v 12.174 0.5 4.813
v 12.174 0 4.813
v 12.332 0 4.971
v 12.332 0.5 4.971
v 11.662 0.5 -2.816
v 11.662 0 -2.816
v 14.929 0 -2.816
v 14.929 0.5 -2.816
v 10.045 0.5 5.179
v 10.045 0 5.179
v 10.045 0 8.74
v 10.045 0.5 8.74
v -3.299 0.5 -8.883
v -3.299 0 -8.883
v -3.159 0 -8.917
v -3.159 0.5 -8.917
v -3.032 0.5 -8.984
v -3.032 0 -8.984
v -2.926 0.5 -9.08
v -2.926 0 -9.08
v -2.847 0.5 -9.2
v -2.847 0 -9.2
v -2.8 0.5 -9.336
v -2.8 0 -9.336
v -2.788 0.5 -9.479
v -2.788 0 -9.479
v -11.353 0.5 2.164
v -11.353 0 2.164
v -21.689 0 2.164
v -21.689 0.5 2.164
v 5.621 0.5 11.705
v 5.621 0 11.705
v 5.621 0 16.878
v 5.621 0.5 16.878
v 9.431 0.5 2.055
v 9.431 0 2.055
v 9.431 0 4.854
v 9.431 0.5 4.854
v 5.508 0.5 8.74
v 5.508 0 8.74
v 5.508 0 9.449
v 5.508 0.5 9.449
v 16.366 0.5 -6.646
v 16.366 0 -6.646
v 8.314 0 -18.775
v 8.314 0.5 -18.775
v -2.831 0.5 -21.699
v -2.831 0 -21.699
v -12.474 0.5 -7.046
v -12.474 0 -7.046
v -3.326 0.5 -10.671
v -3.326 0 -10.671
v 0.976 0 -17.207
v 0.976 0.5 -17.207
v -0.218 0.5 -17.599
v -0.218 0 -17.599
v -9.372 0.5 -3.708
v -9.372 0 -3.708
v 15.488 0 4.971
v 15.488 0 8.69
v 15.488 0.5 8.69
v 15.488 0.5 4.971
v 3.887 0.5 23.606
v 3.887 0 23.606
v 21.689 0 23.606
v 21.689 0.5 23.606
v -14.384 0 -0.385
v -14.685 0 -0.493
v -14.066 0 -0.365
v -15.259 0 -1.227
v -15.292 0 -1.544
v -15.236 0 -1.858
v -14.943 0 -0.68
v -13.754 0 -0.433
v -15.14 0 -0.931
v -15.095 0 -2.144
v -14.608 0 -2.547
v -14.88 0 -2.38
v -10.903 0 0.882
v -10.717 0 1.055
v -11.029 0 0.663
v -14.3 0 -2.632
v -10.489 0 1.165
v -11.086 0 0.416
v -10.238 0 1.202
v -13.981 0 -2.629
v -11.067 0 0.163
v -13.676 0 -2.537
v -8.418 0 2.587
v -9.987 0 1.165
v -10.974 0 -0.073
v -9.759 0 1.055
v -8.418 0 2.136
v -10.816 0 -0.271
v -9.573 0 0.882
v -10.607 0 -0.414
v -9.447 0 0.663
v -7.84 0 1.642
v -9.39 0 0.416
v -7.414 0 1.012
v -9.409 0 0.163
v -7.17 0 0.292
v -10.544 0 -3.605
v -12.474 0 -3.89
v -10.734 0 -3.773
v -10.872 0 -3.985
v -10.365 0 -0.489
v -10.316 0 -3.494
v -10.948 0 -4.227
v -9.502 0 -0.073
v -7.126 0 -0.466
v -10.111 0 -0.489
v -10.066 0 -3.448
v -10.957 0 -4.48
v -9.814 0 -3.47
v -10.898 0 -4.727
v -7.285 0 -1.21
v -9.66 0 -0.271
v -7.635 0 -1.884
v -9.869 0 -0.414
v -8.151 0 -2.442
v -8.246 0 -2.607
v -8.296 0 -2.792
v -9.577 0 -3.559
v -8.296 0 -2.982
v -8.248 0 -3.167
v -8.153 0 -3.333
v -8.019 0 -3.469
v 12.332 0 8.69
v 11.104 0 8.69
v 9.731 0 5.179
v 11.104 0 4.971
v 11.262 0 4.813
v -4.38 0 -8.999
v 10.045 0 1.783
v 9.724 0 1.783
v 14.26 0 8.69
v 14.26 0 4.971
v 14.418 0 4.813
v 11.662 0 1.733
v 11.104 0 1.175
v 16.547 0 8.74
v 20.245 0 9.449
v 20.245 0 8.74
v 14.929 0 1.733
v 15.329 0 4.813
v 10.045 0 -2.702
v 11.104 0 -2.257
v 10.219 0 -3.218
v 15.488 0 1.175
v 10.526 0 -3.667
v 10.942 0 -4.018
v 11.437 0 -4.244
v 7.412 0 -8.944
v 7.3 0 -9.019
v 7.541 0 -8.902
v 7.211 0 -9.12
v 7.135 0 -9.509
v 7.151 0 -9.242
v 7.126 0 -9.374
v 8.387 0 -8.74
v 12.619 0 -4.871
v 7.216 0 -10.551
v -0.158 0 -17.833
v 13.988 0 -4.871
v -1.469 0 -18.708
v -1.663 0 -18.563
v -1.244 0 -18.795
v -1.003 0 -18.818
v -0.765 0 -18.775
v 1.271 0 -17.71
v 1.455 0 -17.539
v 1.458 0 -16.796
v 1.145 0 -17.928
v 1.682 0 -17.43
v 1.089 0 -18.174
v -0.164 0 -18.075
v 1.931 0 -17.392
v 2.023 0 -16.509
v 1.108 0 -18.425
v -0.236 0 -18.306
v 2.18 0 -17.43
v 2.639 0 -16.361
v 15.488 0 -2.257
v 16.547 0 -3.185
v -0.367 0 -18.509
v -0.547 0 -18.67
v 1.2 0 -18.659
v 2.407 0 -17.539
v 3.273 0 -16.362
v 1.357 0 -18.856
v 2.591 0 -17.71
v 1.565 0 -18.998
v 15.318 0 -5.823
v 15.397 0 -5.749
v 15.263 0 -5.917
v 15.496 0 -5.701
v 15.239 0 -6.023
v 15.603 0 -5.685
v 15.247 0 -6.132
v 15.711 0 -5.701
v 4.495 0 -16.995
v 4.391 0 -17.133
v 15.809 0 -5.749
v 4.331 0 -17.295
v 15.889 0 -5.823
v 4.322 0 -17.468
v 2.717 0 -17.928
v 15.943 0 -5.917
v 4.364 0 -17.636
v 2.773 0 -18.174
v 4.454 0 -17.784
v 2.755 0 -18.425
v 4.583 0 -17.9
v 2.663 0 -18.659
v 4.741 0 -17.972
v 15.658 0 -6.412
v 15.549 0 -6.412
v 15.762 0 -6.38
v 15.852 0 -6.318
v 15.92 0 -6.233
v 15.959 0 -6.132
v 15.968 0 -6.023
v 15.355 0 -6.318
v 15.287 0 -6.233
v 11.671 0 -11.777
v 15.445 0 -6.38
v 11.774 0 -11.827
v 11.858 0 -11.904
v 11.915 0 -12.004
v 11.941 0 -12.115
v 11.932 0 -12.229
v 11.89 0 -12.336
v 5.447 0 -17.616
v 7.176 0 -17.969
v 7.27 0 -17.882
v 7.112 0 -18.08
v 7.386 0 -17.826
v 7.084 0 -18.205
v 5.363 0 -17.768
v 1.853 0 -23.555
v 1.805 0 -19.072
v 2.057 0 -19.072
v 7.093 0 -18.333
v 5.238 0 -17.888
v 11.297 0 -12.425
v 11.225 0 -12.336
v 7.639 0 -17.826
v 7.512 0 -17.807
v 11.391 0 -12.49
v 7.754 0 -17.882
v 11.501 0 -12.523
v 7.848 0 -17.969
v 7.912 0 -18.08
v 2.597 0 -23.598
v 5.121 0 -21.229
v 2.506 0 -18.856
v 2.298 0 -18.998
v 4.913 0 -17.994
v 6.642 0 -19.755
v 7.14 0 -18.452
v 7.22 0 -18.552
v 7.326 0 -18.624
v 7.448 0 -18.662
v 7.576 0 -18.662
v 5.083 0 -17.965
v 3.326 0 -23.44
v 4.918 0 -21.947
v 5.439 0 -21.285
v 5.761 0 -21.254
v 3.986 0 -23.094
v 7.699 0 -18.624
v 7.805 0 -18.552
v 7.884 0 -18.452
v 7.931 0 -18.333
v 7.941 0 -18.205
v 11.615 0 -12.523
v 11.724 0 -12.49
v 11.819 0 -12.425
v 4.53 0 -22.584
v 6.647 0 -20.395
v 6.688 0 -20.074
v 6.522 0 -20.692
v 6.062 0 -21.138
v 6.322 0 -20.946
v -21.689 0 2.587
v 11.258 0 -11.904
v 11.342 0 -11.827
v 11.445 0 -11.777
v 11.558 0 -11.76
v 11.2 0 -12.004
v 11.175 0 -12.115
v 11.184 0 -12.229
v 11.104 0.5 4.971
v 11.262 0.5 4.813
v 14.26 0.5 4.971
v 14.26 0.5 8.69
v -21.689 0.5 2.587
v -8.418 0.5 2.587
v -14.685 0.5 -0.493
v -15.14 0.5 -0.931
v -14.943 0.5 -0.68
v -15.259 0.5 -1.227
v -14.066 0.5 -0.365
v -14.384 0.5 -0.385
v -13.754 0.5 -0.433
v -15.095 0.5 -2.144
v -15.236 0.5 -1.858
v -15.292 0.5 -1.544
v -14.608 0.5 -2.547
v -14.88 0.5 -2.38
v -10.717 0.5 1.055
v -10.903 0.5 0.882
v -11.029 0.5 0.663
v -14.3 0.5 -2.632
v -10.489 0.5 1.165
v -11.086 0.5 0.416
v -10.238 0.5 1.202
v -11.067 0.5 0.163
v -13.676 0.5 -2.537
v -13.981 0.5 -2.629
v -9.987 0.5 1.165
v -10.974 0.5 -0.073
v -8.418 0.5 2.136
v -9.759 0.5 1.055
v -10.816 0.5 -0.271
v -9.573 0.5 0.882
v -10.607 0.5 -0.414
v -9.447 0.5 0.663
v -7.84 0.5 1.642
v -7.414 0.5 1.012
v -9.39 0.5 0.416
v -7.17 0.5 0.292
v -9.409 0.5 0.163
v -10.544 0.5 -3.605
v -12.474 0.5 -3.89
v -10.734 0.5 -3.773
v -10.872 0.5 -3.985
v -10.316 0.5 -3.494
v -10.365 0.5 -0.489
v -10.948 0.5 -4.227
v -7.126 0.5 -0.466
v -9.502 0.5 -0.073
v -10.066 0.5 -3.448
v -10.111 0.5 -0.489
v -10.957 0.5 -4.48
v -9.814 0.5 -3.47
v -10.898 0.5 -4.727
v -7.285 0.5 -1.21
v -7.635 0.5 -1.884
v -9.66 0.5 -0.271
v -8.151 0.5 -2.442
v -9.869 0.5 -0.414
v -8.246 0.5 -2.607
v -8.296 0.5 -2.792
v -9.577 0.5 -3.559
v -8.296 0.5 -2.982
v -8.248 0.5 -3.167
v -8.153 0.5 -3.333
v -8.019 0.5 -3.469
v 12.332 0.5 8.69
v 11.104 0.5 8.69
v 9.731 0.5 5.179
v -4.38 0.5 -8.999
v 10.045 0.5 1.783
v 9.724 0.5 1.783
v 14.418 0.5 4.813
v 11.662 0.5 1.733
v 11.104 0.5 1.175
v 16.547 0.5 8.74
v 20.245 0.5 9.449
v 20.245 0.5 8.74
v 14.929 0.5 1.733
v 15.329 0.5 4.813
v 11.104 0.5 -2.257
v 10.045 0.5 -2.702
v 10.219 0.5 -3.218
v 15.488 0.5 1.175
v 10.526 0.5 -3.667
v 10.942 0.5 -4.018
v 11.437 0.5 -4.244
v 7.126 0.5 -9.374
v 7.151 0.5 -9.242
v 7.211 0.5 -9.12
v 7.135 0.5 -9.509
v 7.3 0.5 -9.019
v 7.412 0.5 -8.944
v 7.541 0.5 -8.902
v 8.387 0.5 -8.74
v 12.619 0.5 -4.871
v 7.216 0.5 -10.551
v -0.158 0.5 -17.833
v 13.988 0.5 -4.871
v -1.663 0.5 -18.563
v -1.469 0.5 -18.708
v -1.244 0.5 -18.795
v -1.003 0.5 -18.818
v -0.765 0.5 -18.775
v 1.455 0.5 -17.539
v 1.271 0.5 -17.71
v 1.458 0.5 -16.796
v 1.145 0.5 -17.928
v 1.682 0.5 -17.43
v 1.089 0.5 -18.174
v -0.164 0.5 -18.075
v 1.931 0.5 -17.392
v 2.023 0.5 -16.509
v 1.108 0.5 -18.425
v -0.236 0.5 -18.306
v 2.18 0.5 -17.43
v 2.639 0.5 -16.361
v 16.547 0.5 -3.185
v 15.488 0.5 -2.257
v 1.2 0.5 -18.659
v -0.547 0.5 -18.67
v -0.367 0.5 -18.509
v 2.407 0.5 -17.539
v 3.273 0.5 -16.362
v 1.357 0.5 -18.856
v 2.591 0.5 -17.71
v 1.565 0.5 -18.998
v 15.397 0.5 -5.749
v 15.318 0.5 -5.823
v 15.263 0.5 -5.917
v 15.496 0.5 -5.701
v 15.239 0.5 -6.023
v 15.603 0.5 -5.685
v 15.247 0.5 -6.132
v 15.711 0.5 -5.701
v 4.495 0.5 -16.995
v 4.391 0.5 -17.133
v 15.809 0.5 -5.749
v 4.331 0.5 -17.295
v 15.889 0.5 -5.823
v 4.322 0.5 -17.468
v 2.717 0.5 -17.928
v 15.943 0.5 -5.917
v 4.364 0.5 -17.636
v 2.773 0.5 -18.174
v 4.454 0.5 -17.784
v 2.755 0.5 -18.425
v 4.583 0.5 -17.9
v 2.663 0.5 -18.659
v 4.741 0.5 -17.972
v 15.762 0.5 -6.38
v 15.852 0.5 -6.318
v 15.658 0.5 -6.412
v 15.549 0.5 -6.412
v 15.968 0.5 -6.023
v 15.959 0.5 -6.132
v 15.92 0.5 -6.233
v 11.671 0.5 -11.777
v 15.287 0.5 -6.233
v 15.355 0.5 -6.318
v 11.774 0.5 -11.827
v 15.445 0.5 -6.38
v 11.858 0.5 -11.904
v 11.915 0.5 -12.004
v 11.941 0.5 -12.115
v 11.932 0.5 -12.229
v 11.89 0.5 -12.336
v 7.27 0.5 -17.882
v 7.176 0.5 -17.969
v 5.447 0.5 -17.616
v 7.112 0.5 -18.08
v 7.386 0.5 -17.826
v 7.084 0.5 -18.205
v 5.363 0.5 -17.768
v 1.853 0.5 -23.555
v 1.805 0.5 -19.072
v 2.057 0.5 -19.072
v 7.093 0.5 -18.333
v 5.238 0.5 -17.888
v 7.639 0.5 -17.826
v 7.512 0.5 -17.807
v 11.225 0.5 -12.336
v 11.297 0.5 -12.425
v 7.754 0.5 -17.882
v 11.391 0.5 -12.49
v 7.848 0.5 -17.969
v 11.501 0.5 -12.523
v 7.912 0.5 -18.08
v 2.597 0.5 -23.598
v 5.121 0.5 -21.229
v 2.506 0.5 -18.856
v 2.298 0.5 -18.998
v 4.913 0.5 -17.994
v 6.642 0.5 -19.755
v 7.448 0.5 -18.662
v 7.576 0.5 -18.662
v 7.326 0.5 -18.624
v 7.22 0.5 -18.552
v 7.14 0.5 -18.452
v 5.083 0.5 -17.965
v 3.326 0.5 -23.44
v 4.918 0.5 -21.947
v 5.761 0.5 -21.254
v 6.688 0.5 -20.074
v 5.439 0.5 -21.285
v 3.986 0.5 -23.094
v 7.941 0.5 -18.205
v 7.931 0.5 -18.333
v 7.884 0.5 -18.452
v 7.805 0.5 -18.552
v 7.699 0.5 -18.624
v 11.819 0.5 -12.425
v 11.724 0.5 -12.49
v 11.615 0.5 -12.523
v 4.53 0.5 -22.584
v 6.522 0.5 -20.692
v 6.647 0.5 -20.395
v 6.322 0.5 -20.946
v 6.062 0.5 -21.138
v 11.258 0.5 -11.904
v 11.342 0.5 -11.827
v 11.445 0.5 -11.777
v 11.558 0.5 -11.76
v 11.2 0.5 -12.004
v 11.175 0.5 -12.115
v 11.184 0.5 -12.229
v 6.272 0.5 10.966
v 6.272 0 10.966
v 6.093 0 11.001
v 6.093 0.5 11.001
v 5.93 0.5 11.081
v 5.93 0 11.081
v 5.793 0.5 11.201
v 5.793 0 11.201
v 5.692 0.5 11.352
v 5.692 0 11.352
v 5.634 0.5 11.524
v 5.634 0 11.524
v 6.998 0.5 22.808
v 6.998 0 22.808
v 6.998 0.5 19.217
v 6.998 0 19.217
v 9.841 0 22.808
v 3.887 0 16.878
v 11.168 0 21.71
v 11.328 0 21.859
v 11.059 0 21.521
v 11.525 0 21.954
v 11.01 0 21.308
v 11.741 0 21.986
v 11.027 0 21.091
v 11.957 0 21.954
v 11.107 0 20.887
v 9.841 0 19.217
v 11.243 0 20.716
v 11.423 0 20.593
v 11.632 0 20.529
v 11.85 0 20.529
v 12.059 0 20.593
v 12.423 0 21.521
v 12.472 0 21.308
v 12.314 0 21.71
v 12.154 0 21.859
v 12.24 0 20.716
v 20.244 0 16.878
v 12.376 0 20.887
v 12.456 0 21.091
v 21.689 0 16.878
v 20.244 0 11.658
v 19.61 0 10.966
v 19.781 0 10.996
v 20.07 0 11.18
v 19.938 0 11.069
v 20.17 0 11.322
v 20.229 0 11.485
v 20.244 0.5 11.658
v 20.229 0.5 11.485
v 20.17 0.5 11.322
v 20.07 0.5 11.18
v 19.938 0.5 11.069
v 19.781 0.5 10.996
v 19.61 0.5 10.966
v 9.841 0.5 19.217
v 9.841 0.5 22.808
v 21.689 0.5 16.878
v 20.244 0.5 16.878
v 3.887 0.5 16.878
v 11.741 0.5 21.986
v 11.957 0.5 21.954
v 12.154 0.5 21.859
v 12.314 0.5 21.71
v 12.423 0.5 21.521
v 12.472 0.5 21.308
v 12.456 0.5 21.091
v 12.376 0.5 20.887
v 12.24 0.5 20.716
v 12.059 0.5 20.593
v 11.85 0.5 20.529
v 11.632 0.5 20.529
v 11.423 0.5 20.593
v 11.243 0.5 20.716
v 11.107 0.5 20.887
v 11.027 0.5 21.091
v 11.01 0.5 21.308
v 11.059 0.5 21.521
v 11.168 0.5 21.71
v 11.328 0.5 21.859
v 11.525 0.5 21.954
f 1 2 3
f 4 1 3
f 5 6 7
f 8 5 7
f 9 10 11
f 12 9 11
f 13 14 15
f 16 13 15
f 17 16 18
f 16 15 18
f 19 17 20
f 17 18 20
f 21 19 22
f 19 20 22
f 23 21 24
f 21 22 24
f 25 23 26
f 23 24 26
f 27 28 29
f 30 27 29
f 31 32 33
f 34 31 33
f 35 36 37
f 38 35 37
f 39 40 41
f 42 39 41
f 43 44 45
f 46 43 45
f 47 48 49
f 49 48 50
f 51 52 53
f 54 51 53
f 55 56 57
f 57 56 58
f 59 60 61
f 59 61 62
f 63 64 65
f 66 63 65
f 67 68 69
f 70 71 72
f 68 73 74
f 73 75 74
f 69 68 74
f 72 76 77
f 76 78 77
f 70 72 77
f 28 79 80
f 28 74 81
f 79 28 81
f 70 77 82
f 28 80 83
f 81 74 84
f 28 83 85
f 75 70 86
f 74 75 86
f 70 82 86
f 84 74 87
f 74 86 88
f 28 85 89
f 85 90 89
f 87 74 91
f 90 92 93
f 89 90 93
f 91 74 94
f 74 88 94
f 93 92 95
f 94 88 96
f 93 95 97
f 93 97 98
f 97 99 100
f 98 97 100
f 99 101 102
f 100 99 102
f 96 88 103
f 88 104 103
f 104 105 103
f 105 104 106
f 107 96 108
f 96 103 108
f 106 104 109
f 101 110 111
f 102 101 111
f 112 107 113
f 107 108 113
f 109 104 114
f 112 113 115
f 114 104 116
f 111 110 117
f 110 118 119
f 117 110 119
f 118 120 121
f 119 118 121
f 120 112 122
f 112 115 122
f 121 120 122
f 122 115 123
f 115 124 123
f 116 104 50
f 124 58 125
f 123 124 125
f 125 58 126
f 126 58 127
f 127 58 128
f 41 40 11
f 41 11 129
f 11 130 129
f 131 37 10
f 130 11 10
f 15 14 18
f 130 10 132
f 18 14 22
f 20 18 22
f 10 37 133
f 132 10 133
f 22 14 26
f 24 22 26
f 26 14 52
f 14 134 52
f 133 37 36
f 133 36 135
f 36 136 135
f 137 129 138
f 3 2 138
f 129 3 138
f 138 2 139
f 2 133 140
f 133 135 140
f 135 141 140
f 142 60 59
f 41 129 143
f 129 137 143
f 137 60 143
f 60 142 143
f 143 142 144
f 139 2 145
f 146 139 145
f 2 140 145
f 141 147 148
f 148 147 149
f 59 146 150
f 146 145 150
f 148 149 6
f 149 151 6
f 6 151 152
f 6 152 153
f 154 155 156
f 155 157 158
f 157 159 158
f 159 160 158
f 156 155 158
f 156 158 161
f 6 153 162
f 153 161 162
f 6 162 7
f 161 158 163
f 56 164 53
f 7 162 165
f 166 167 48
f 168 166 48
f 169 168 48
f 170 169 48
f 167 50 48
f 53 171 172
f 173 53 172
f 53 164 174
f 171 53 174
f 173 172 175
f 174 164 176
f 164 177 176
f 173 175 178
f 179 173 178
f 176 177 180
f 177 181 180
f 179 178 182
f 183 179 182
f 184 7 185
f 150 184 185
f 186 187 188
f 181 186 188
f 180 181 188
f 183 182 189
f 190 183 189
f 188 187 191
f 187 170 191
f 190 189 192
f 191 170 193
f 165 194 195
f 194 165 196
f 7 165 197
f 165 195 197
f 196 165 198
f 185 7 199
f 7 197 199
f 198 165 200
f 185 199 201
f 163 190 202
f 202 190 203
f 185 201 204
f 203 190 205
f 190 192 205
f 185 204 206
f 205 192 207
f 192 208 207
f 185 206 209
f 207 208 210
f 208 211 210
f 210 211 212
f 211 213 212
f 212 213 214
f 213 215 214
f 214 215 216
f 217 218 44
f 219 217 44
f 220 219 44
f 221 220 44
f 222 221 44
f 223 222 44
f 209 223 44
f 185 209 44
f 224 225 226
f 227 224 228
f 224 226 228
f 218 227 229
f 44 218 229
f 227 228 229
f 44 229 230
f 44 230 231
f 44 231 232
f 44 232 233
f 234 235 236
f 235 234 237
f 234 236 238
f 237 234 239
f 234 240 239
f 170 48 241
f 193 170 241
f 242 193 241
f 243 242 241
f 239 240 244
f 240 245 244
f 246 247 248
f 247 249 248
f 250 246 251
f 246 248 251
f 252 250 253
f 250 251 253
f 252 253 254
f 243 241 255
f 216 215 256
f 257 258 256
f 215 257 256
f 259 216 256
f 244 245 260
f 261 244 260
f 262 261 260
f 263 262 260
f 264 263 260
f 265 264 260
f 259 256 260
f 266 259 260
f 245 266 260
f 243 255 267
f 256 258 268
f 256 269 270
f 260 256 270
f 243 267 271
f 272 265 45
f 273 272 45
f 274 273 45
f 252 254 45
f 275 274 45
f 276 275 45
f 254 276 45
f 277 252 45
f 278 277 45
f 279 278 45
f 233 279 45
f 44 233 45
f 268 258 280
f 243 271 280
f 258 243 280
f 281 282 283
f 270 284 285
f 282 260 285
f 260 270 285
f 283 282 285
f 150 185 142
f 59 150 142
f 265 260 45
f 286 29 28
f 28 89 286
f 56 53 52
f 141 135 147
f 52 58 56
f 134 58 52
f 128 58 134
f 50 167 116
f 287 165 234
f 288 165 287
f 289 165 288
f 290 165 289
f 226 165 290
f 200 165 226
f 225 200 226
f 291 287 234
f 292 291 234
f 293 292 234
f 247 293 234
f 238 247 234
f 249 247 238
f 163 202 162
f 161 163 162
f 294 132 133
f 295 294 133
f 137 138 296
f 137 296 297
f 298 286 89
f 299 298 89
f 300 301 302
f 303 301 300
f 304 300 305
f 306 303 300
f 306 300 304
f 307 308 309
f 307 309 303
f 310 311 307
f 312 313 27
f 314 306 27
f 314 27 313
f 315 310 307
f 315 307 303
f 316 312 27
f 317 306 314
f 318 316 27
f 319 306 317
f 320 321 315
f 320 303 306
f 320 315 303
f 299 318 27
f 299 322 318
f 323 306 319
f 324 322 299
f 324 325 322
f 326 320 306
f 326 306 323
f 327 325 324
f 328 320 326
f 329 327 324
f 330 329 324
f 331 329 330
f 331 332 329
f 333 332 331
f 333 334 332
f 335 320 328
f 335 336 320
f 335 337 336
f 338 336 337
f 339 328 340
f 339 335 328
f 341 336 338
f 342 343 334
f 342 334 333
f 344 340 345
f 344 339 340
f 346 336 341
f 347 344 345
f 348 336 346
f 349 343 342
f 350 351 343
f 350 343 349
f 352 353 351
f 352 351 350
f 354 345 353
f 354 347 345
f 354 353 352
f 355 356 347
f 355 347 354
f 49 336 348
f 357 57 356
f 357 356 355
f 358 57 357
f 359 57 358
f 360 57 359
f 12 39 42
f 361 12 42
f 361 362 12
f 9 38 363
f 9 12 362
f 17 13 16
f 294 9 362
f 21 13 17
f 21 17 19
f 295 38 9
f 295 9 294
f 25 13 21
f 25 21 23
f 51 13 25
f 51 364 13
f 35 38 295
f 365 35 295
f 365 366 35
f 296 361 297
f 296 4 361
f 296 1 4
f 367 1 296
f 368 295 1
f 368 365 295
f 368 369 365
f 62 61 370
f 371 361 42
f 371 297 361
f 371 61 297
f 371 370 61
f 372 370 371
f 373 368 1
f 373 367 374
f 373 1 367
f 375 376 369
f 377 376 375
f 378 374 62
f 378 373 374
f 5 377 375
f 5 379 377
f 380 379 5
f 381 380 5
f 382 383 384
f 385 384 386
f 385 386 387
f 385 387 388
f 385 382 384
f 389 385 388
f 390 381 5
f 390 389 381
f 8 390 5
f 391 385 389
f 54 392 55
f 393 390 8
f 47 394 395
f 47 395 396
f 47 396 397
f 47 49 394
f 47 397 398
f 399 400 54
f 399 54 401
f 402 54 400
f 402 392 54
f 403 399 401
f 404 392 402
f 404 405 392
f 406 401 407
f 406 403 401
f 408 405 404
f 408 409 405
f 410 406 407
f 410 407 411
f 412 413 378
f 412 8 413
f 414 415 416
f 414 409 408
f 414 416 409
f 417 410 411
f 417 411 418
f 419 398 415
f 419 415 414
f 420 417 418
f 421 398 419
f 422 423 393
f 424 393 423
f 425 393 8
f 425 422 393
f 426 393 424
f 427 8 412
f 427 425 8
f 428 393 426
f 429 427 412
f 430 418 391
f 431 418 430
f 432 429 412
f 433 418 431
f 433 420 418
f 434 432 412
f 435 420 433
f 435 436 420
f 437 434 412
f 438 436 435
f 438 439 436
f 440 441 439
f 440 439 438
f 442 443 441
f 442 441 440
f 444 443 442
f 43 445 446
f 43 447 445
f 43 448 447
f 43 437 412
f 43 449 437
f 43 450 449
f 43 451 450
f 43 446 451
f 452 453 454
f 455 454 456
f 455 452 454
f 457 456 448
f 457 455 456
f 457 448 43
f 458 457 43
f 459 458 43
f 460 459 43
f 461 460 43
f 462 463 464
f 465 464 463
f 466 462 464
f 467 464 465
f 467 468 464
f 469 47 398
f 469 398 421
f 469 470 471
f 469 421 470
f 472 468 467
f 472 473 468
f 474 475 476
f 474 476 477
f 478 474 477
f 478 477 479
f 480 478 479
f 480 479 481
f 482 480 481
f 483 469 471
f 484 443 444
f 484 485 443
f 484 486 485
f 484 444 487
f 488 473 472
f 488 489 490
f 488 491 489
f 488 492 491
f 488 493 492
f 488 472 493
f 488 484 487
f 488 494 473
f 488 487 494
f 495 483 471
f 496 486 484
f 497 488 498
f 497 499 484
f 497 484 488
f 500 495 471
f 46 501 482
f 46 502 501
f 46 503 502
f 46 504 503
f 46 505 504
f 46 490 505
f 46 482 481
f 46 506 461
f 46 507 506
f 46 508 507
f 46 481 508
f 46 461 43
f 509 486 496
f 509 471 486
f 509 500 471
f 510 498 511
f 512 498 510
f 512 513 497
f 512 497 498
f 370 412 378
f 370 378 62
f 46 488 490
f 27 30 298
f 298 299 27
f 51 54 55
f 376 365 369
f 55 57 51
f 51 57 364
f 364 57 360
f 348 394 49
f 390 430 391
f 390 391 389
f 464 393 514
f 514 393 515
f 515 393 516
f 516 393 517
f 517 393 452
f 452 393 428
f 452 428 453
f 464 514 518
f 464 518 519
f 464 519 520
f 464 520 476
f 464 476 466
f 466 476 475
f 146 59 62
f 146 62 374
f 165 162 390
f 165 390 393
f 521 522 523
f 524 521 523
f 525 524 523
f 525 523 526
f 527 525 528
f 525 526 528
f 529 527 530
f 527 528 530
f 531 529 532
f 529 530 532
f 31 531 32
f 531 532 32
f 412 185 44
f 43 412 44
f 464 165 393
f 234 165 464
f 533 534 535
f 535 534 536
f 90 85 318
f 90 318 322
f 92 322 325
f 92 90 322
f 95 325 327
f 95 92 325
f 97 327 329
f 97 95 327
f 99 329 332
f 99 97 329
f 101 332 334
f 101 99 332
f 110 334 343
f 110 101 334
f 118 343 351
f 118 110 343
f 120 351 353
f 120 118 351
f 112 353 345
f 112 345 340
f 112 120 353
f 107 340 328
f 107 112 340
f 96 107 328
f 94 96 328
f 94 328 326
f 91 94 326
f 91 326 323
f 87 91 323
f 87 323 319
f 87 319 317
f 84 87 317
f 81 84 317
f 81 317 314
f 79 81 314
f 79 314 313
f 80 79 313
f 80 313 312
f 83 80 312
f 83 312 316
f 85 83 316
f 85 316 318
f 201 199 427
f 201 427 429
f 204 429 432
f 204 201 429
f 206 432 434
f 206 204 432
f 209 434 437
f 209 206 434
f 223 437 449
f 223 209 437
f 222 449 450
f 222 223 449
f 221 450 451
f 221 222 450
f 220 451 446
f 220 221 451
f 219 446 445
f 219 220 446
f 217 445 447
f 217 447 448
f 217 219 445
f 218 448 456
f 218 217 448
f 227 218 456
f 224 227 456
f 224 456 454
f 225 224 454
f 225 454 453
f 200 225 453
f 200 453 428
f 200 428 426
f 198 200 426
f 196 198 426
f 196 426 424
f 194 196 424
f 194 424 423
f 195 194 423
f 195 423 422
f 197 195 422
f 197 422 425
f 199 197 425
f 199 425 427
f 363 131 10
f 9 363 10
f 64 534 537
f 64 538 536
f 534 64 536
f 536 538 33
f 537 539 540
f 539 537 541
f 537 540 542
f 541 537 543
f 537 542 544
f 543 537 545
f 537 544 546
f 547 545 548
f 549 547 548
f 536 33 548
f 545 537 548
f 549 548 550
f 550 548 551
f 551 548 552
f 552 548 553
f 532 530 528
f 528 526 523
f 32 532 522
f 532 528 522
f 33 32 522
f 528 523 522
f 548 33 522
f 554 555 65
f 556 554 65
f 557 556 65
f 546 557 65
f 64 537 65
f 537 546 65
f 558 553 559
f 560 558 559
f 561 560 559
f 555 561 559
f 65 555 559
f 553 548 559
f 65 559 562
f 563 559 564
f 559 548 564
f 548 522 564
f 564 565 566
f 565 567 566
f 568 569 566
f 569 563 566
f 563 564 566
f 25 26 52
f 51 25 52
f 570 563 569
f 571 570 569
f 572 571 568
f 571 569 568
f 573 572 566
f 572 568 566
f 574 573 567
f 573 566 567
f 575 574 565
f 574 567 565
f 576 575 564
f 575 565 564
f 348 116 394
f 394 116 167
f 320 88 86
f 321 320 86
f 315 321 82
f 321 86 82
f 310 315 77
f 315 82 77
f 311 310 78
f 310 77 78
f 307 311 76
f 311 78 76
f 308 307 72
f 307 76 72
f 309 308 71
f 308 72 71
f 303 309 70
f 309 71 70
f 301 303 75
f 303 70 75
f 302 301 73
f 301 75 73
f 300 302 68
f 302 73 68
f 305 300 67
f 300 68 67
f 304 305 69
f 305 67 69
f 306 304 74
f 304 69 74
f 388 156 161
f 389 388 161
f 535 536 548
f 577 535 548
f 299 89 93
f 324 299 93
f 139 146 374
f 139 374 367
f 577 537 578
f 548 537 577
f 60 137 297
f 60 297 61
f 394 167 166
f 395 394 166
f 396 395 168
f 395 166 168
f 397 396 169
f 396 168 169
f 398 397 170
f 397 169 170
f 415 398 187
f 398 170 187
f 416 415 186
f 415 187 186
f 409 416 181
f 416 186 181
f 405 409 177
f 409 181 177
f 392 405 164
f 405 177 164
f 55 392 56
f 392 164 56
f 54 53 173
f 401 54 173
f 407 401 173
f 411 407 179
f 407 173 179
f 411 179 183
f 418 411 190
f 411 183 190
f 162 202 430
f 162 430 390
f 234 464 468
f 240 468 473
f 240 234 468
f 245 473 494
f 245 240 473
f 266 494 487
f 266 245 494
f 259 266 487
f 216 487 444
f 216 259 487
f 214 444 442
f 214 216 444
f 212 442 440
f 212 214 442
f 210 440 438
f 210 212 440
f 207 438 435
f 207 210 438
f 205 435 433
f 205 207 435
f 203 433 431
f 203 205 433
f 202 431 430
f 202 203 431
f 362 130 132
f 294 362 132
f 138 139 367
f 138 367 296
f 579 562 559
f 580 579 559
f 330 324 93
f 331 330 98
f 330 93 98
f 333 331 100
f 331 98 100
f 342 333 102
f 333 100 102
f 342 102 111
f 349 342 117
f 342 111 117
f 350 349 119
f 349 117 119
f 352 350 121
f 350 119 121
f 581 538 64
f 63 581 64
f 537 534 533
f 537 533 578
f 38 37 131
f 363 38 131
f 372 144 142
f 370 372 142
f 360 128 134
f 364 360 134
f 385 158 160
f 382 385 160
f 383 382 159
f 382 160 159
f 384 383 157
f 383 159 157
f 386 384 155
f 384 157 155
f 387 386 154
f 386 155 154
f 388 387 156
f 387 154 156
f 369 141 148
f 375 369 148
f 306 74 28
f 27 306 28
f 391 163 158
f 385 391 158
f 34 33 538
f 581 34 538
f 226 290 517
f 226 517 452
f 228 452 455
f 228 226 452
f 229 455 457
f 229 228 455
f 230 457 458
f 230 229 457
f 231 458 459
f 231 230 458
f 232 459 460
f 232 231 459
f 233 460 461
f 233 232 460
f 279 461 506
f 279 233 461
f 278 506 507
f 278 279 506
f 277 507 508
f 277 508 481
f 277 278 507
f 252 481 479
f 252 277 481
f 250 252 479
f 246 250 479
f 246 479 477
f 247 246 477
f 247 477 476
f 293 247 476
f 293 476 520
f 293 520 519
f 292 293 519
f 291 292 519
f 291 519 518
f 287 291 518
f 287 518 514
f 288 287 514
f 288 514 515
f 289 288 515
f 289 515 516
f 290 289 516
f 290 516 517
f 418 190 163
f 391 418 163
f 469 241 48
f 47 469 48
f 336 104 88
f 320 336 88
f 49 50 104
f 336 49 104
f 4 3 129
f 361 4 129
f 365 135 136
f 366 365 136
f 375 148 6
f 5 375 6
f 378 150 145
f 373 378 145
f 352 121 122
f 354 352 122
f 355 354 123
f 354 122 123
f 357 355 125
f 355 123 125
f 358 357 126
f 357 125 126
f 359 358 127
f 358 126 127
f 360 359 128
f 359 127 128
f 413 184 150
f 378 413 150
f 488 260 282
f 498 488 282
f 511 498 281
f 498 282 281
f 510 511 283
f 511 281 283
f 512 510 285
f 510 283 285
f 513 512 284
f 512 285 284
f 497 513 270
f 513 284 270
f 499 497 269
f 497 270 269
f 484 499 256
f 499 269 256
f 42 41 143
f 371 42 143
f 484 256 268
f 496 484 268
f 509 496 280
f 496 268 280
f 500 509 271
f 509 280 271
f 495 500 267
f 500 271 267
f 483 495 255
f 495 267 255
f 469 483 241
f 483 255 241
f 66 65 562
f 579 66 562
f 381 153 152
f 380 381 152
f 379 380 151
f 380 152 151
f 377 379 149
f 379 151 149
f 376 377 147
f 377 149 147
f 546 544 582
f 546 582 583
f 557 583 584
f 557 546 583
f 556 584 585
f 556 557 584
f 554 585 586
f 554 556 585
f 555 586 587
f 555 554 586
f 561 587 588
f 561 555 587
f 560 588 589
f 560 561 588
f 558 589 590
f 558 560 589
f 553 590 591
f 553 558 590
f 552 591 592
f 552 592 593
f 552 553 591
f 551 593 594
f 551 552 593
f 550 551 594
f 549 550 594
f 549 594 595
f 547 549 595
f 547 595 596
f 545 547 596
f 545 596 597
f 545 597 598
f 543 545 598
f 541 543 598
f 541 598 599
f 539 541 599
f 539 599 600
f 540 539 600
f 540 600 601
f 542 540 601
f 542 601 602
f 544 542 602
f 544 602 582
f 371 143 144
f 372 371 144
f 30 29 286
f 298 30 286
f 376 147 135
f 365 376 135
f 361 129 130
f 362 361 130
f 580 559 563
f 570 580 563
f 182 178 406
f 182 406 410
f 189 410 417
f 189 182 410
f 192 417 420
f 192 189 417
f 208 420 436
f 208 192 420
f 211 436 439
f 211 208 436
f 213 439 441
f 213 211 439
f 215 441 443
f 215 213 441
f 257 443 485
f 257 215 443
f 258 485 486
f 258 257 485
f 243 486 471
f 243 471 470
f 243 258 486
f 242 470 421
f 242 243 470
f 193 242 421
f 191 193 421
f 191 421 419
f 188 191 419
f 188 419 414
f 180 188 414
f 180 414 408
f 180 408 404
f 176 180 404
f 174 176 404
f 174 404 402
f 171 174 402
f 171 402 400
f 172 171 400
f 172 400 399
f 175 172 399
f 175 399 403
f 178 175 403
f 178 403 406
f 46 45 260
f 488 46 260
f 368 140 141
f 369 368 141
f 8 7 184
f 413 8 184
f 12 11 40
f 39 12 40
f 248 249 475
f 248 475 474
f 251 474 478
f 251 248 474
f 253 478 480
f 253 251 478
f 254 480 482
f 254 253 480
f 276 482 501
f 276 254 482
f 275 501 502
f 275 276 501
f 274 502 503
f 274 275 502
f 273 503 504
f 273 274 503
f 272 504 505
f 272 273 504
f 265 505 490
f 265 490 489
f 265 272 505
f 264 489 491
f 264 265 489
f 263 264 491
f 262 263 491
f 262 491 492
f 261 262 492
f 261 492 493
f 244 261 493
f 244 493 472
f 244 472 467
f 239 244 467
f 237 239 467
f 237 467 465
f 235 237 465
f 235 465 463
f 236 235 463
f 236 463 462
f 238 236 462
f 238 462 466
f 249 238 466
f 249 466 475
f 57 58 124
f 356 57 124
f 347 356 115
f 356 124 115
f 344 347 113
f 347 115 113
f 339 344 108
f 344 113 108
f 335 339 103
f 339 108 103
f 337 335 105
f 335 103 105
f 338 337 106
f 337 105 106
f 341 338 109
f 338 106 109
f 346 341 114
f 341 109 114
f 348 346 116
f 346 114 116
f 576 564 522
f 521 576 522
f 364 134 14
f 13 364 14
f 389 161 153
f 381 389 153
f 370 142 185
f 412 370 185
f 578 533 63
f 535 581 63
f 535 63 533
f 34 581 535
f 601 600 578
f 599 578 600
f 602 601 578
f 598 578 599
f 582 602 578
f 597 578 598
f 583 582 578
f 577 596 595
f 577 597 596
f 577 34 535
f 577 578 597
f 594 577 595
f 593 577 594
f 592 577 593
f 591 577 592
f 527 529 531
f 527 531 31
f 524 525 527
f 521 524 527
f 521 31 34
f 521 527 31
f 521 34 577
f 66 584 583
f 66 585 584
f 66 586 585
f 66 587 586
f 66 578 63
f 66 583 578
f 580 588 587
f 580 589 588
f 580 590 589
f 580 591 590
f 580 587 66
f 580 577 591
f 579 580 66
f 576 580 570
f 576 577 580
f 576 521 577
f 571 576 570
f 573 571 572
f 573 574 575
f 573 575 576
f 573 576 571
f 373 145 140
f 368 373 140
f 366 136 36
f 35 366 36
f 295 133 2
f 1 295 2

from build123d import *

# Parameters (mm, degrees)
SKETCH4_R             = 0.750267771
SKETCH4_R_2           = 0.265378854
SKETCH4_R_3           = 0.744648083
SKETCH4_R_4           = 0.32969998
SKETCH4_R_5           = 0.283853506
BOSS_EXTRUDE1_DEPTH   = 0.5
SKETCH4_R_6           = 0.632780779
SKETCH4_W             = 2.64350155
SKETCH4_H             = 3.390658061
BOSS_EXTRUDE1_2_DEPTH = 0.5
CUT_EXTRUDE2_START    = -10
CUT_EXTRUDE2_DEPTH    = 10
CUT_EXTRUDE3_START    = -10
SKETCH6_R             = 0.732780779
SKETCH6_R_2           = 0.632780779
SKETCH6_R_3           = 0.850267771
SKETCH6_R_4           = 0.750267771
SKETCH6_R_5           = 0.844648083
SKETCH6_R_6           = 0.744648083
SKETCH6_R_7           = 0.42969998
SKETCH6_R_8           = 0.32969998
SKETCH6_R_9           = 0.365378854
SKETCH6_R_10          = 0.265378854
SKETCH6_W             = 2.84350155
SKETCH6_H             = 3.590658061
SKETCH6_W_2           = 2.64350155
SKETCH6_H_2           = 3.390658061
SKETCH6_R_11          = 0.383853506
SKETCH6_R_12          = 0.283853506
CUT_EXTRUDE3_DEPTH    = 10


with BuildPart() as part:
    # Sketch4 → Boss-Extrude1 (new body)
    with BuildSketch(Plane(origin=(0, 0, 0), x_dir=(1, 0, 0), z_dir=(0, 1, 0))):
        with BuildLine():
            Line((-11.696283574, -2.014082393), (-21.838660036, -2.014082393))
            Line((-21.838660036, -2.014082393), (-21.838660036, -2.737299418))
            Line((-21.838660036, -2.737299418), (-8.267641282, -2.737299418))
            Line((-8.267641282, -2.737299418), (-8.267641282, -2.216070709))
            ThreePointArc((-8.267641282, -2.216070709), (-6.9710726, 0.108801001), (-8.041746829, 2.545966467))
            ThreePointArc((-8.041746829, 2.545966467), (-8.144633072, 2.982775881), (-7.908513733, 3.364398341))
            Line((-7.908513733, 3.364398341), (-4.305242174, 8.839733186))
            Line((-4.305242174, 8.839733186), (-3.299405457, 8.732581616))
            ThreePointArc((-3.299405457, 8.732581616), (-2.807647773, 8.98755206), (-2.639809989, 9.515440329))
            Line((-2.639809989, 9.515440329), (-3.155299637, 10.657283488))
            Line((-3.155299637, 10.657283488), (0.999182594, 16.970207993))
            ThreePointArc((0.999182594, 16.970207993), (2.017035083, 16.351359893), (3.199096829, 16.203960132))
            Line((3.199096829, 16.203960132), (7.062416262, 10.510667533))
            Line((7.062416262, 10.510667533), (6.986470802, 9.529316973))
            ThreePointArc((6.986470802, 9.529316973), (7.088909536, 9.032904845), (7.512361042, 8.754323587))
            Line((7.512361042, 8.754323587), (8.297542954, 8.603970949))
            Line((8.297542954, 8.603970949), (11.203908829, 4.320920683))
            ThreePointArc((11.203908829, 4.320920683), (10.34420923, 3.685817641), (9.894897145, 2.715993984))
            Line((9.894897145, 2.715993984), (9.894897145, -1.633176582))
            Line((9.894897145, -1.633176582), (9.665577443, -1.633176582))
            Line((9.665577443, -1.633176582), (9.280761035, -1.988912184))
            Line((9.280761035, -1.988912184), (9.280761035, -4.912831705))
            Line((9.280761035, -4.912831705), (9.665577443, -5.329106227))
            Line((9.665577443, -5.329106227), (9.894897145, -5.329106227))
            Line((9.894897145, -5.329106227), (9.894897145, -8.590016683))
            Line((9.894897145, -8.590016683), (5.357513848, -8.590016683))
            Line((5.357513848, -8.590016683), (5.357513848, -9.598509545))
            Line((5.357513848, -9.598509545), (20.394810246, -9.598509545))
            Line((20.394810246, -9.598509545), (20.394810246, -8.590016683))
            Line((20.394810246, -8.590016683), (16.696957273, -8.590016683))
            Line((16.696957273, -8.590016683), (16.696957273, 3.188629617))
            Line((16.696957273, 3.188629617), (16.513647646, 6.695111796))
            Line((16.513647646, 6.695111796), (8.419413526, 18.886774693))
            Line((8.419413526, 18.886774693), (6.813548497, 19.827890477))
            ThreePointArc((6.813548497, 19.827890477), (6.445780879, 21.035174164), (5.24174765, 21.413447748))
            ThreePointArc((5.24174765, 21.413447748), (3.999308004, 23.267073464), (1.810059191, 23.699247279))
            Line((1.810059191, 23.699247279), (-2.930027074, 21.821131787))
            Line((-2.930027074, 21.821131787), (-12.623890047, 7.090866568))
            Line((-12.623890047, 7.090866568), (-12.623890047, 3.94718675))
            Line((-12.623890047, 3.94718675), (-13.717599439, 2.715993984))
            ThreePointArc((-13.717599439, 2.715993984), (-15.442222206, 1.544355583), (-13.799219853, 0.2607655))
            Line((-13.799219853, 0.2607655), (-11.696283574, -2.014082393))
        make_face()
        Polygon((15.387945589, -5.012831705), (15.387945589, -8.590016683), (14.359515417, -8.590016683), (14.359515417, -5.012831705), (14.459515417, -4.912831705), (15.287945589, -4.912831705), align=None, mode=Mode.SUBTRACT)
        Polygon((12.232339001, -5.012831705), (12.232339001, -8.590016683), (11.203908829, -8.590016683), (11.203908829, -5.012831705), (11.303908829, -4.912831705), (12.132339001, -4.912831705), align=None, mode=Mode.SUBTRACT)
        with Locations(Location((-10.238001202, -0.352181677, 0), (0, 0, 270))):
            Circle(SKETCH4_R, mode=Mode.SUBTRACT)
        with BuildLine():
            ThreePointArc((-9.448675298, 3.772911532), (-10.488171503, 3.68816485), (-10.80864856, 4.68065103))
            Line((-10.80864856, 4.68065103), (-1.58551386, 18.498730584))
            ThreePointArc((-1.58551386, 18.498730584), (-0.602864551, 18.586331432), (-0.306829257, 17.645248717))
            Line((-0.306829257, 17.645248717), (-9.448675298, 3.772911532))
        make_face(mode=Mode.SUBTRACT)
        with BuildLine():
            Line((12.672348148, 4.971230017), (4.572305297, 17.059398095))
            ThreePointArc((4.572305297, 17.059398095), (4.638532997, 17.816162349), (5.357513848, 17.570918019))
            Line((5.357513848, 17.570918019), (13.800316104, 4.971230017))
            Line((13.800316104, 4.971230017), (12.672348148, 4.971230017))
        make_face(mode=Mode.SUBTRACT)
        Polygon((14.887945589, 2.715993984), (15.387945589, 2.215993984), (15.387945589, -1.133176582), (14.887945589, -1.633176582), (11.703908829, -1.633176582), (11.203908829, -1.133176582), (11.203908829, 2.215993984), (11.703908829, 2.715993984), align=None, mode=Mode.SUBTRACT)
        with Locations(Location((15.603207878, 6.050507476, 0), (0, 0, 270))):
            Circle(SKETCH4_R_2, mode=Mode.SUBTRACT)
        with Locations(Location((1.931063129, 18.237068392, 0), (0, 0, 270))):
            Circle(SKETCH4_R_3, mode=Mode.SUBTRACT)
        with Locations(Location((7.512361042, 18.237068392, 0), (0, 0, 270))):
            Circle(SKETCH4_R_4, mode=Mode.SUBTRACT)
        with Locations(Location((11.55778446, 12.143787934, 0), (0, 0, 270))):
            Circle(SKETCH4_R_5, mode=Mode.SUBTRACT)
    extrude(amount=BOSS_EXTRUDE1_DEPTH)


with BuildPart() as body_2:
    # Sketch4 → Boss-Extrude1 2 (new body)
    with BuildSketch(Plane(origin=(0, 0, 0), x_dir=(1, 0, 0), z_dir=(0, 1, 0))):
        with BuildLine():
            Line((19.613108594, -10.815832828), (6.267197301, -10.815832828))
            ThreePointArc((6.267197301, -10.815832828), (5.68414714, -11.098078534), (5.47144627, -11.70993511))
            Line((5.47144627, -11.70993511), (5.47144627, -16.728123553))
            Line((5.47144627, -16.728123553), (3.736597162, -16.728123553))
            Line((3.736597162, -16.728123553), (3.736597162, -23.756096292))
            Line((3.736597162, -23.756096292), (21.838660036, -23.756096292))
            Line((21.838660036, -23.756096292), (21.838660036, -16.728123553))
            Line((21.838660036, -16.728123553), (20.394183639, -16.728123553))
            Line((20.394183639, -16.728123553), (20.394183639, -11.660759485))
            ThreePointArc((20.394183639, -11.660759485), (20.178636157, -11.076530218), (19.613108594, -10.815832828))
        make_face()
        with Locations(Location((11.741164301, -21.25357645, 0), (0, 0, 270))):
            Circle(SKETCH4_R_6, mode=Mode.SUBTRACT)
        with Locations((8.419413526, -21.012384273)):
            Rectangle(SKETCH4_W, SKETCH4_H, mode=Mode.SUBTRACT)
    extrude(amount=BOSS_EXTRUDE1_2_DEPTH)


with BuildPart() as cut_extrude2_tool:
    # Sketch5 → Cut-Extrude2 (new body)
    # profile 1 of 2: a face of its own
    with BuildSketch(Plane(origin=(0, 0.5, 0), x_dir=(1, 0, 0), z_dir=(0, 1, 0)).offset(CUT_EXTRUDE2_START)):
        with BuildLine():
            Line((20.394183639, -16.728123553), (20.394183639, -11.660759485))
            ThreePointArc((20.394183639, -11.660759485), (20.178636157, -11.076530218), (19.613108594, -10.815832828))
            Line((19.613108594, -10.815832828), (6.267197301, -10.815832828))
            ThreePointArc((6.267197301, -10.815832828), (5.68414714, -11.098078534), (5.47144627, -11.70993511))
            Line((5.47144627, -11.70993511), (5.47144627, -16.728123553))
            Line((5.47144627, -16.728123553), (3.736597162, -16.728123553))
            Line((3.736597162, -16.728123553), (3.736597162, -23.756096292))
            Line((3.736597162, -23.756096292), (21.838660036, -23.756096292))
            Line((21.838660036, -23.756096292), (21.838660036, -16.728123553))
            Line((21.838660036, -16.728123553), (20.394183639, -16.728123553))
        make_face()
        with BuildLine():
            Line((20.244183639, -16.878123553), (20.244183639, -11.657665517))
            ThreePointArc((20.244183639, -11.657665517), (20.070382374, -11.18040847), (19.610014627, -10.965832828))
            Line((19.610014627, -10.965832828), (6.271771424, -10.965832828))
            ThreePointArc((6.271771424, -10.965832828), (5.79344755, -11.200910159), (5.62144627, -11.705360988))
            Line((5.62144627, -11.705360988), (5.62144627, -16.878123553))
            Line((5.62144627, -16.878123553), (3.886597162, -16.878123553))
            Line((3.886597162, -16.878123553), (3.886597162, -23.606096292))
            Line((3.886597162, -23.606096292), (21.688660036, -23.606096292))
            Line((21.688660036, -23.606096292), (21.688660036, -16.878123553))
            Line((21.688660036, -16.878123553), (20.244183639, -16.878123553))
        make_face(mode=Mode.SUBTRACT)
    # profile 2 of 2: a face of its own
    with BuildSketch(Plane(origin=(0, 0.5, 0), x_dir=(1, 0, 0), z_dir=(0, 1, 0)).offset(CUT_EXTRUDE2_START)):
        with BuildLine():
            Line((9.894897145, -5.329106227), (9.894897145, -8.590016683))
            Line((9.894897145, -8.590016683), (5.357513848, -8.590016683))
            Line((5.357513848, -8.590016683), (5.357513848, -9.598509545))
            Line((5.357513848, -9.598509545), (20.394810246, -9.598509545))
            Line((20.394810246, -9.598509545), (20.394810246, -8.590016683))
            Line((20.394810246, -8.590016683), (16.696957273, -8.590016683))
            Line((16.696957273, -8.590016683), (16.696957273, 3.188629617))
            Line((16.696957273, 3.188629617), (16.513647646, 6.695111796))
            Line((16.513647646, 6.695111796), (8.419413526, 18.886774693))
            Line((8.419413526, 18.886774693), (6.813548497, 19.827890477))
            ThreePointArc((6.813548497, 19.827890477), (6.445780879, 21.035174164), (5.24174765, 21.413447748))
            ThreePointArc((5.24174765, 21.413447748), (3.999308004, 23.267073464), (1.810059191, 23.699247279))
            Line((1.810059191, 23.699247279), (-2.930027074, 21.821131787))
            Line((-2.930027074, 21.821131787), (-12.623890047, 7.090866568))
            Line((-12.623890047, 7.090866568), (-12.623890047, 3.94718675))
            Line((-12.623890047, 3.94718675), (-13.717599439, 2.715993984))
            ThreePointArc((-13.717599439, 2.715993984), (-15.442222206, 1.544355583), (-13.799219853, 0.2607655))
            Line((-13.799219853, 0.2607655), (-11.696283574, -2.014082393))
            Line((-11.696283574, -2.014082393), (-21.838660036, -2.014082393))
            Line((-21.838660036, -2.014082393), (-21.838660036, -2.737299418))
            Line((-21.838660036, -2.737299418), (-8.267641282, -2.737299418))
            Line((-8.267641282, -2.737299418), (-8.267641282, -2.216070709))
            ThreePointArc((-8.267641282, -2.216070709), (-6.9710726, 0.108801001), (-8.041746829, 2.545966467))
            ThreePointArc((-8.041746829, 2.545966467), (-8.144633072, 2.982775881), (-7.908513733, 3.364398341))
            Line((-7.908513733, 3.364398341), (-4.305242174, 8.839733186))
            Line((-4.305242174, 8.839733186), (-3.299405457, 8.732581616))
            ThreePointArc((-3.299405457, 8.732581616), (-2.807647773, 8.98755206), (-2.639809989, 9.515440329))
            Line((-2.639809989, 9.515440329), (-3.155299637, 10.657283488))
            Line((-3.155299637, 10.657283488), (0.999182594, 16.970207993))
            ThreePointArc((0.999182594, 16.970207993), (2.017035083, 16.351359893), (3.199096829, 16.203960132))
            Line((3.199096829, 16.203960132), (7.062416262, 10.510667533))
            Line((7.062416262, 10.510667533), (6.986470802, 9.529316973))
            ThreePointArc((6.986470802, 9.529316973), (7.088909536, 9.032904845), (7.512361042, 8.754323587))
            Line((7.512361042, 8.754323587), (8.297542954, 8.603970949))
            Line((8.297542954, 8.603970949), (11.203908829, 4.320920683))
            ThreePointArc((11.203908829, 4.320920683), (10.34420923, 3.685817641), (9.894897145, 2.715993984))
            Line((9.894897145, 2.715993984), (9.894897145, -1.633176582))
            Line((9.894897145, -1.633176582), (9.665577443, -1.633176582))
            Line((9.665577443, -1.633176582), (9.280761035, -1.988912184))
            Line((9.280761035, -1.988912184), (9.280761035, -4.912831705))
            Line((9.280761035, -4.912831705), (9.665577443, -5.329106227))
            Line((9.665577443, -5.329106227), (9.894897145, -5.329106227))
        make_face()
        with BuildLine():
            Line((10.044897145, -5.179106227), (10.044897145, -8.740016683))
            Line((10.044897145, -8.740016683), (5.507513848, -8.740016683))
            Line((5.507513848, -8.740016683), (5.507513848, -9.448509545))
            Line((5.507513848, -9.448509545), (20.244810246, -9.448509545))
            Line((20.244810246, -9.448509545), (20.244810246, -8.740016683))
            Line((20.244810246, -8.740016683), (16.546957273, -8.740016683))
            Line((16.546957273, -8.740016683), (16.546957273, 3.184711491))
            Line((16.546957273, 3.184711491), (16.365993628, 6.646317993))
            Line((16.365993628, 6.646317993), (8.313637636, 18.774903394))
            Line((8.313637636, 18.774903394), (6.642100878, 19.754506037))
            ThreePointArc((6.642100878, 19.754506037), (6.322304084, 20.946333695), (5.121156655, 21.229119847))
            ThreePointArc((5.121156655, 21.229119847), (3.98633999, 23.093904553), (1.852600254, 23.554757679))
            Line((1.852600254, 23.554757679), (-2.830754532, 21.699120315))
            Line((-2.830754532, 21.699120315), (-12.473890047, 7.045937773))
            Line((-12.473890047, 7.045937773), (-12.473890047, 3.890183505))
            Line((-12.473890047, 3.890183505), (-13.675897608, 2.537079084))
            ThreePointArc((-13.675897608, 2.537079084), (-15.292141792, 1.543998988), (-13.754390782, 0.433244663))
            Line((-13.754390782, 0.433244663), (-11.353345282, -2.164082393))
            Line((-11.353345282, -2.164082393), (-21.688660036, -2.164082393))
            Line((-21.688660036, -2.164082393), (-21.688660036, -2.587299418))
            Line((-21.688660036, -2.587299418), (-8.417641282, -2.587299418))
            Line((-8.417641282, -2.587299418), (-8.417641282, -2.135708192))
            ThreePointArc((-8.417641282, -2.135708192), (-7.122504541, 0.0855942), (-8.151420666, 2.442052368))
            ThreePointArc((-8.151420666, 2.442052368), (-8.296245408, 2.982419388), (-8.019499448, 3.468611114))
            Line((-8.019499448, 3.468611114), (-4.380276751, 8.998575347))
            Line((-4.380276751, 8.998575347), (-3.298731155, 8.883358526))
            ThreePointArc((-3.298731155, 8.883358526), (-2.925808152, 9.080147199), (-2.78773844, 9.478561684))
            Line((-2.78773844, 9.478561684), (-3.325976175, 10.670793342))
            Line((-3.325976175, 10.670793342), (0.975596103, 17.207227858))
            ThreePointArc((0.975596103, 17.207227858), (2.022674542, 16.508657782), (3.272865989, 16.362388331))
            Line((3.272865989, 16.362388331), (7.216020448, 10.551444535))
            Line((7.216020448, 10.551444535), (7.13533331, 9.508823062))
            ThreePointArc((7.13533331, 9.508823062), (7.210834119, 9.120394319), (7.540571639, 8.901646912))
            Line((7.540571639, 8.901646912), (8.386776871, 8.739609062))
            Line((8.386776871, 8.739609062), (11.437155352, 4.244330447))
            ThreePointArc((11.437155352, 4.244330447), (10.525922488, 3.667301963), (10.044897145, 2.701940981))
            Line((10.044897145, 2.701940981), (10.044897145, -1.783176582))
            Line((10.044897145, -1.783176582), (9.724288126, -1.783176582))
            Line((9.724288126, -1.783176582), (9.430761035, -2.054521656))
            Line((9.430761035, -2.054521656), (9.430761035, -4.854121022))
            Line((9.430761035, -4.854121022), (9.731186914, -5.179106227))
            Line((9.731186914, -5.179106227), (10.044897145, -5.179106227))
        make_face(mode=Mode.SUBTRACT)
    extrude(amount=CUT_EXTRUDE2_DEPTH)


with BuildPart() as part_1:
    add(part.part)

    # Cut-Extrude2: cut by cut_extrude2_tool
    add(cut_extrude2_tool.part, mode=Mode.SUBTRACT)


with BuildPart() as body_2_1:
    add(body_2.part)

    # Cut-Extrude2: cut by cut_extrude2_tool
    add(cut_extrude2_tool.part, mode=Mode.SUBTRACT)


with BuildPart() as cut_extrude3_tool:
    # Sketch6 → Cut-Extrude3 (new body)
    # profile 1 of 12: a face of its own
    with BuildSketch(Plane(origin=(0, 0.5, 0), x_dir=(1, 0, 0), z_dir=(0, 1, 0)).offset(CUT_EXTRUDE3_START)):
        with Locations(Location((11.741164301, -21.25357645, 0), (0, 0, 270))):
            Circle(SKETCH6_R)
        with Locations((11.741164301, -21.25357645)):
            Circle(SKETCH6_R_2, mode=Mode.SUBTRACT)
    # profile 2 of 12: a face of its own
    with BuildSketch(Plane(origin=(0, 0.5, 0), x_dir=(1, 0, 0), z_dir=(0, 1, 0)).offset(CUT_EXTRUDE3_START)):
        with Locations(Location((-10.238001202, -0.352181677, 0), (0, 0, 270))):
            Circle(SKETCH6_R_3)
        with Locations((-10.238001202, -0.352181677)):
            Circle(SKETCH6_R_4, mode=Mode.SUBTRACT)
    # profile 3 of 12: a face of its own
    with BuildSketch(Plane(origin=(0, 0.5, 0), x_dir=(1, 0, 0), z_dir=(0, 1, 0)).offset(CUT_EXTRUDE3_START)):
        with Locations(Location((1.931063129, 18.237068392, 0), (0, 0, 270))):
            Circle(SKETCH6_R_5)
        with Locations((1.931063129, 18.237068392)):
            Circle(SKETCH6_R_6, mode=Mode.SUBTRACT)
    # profile 4 of 12: a face of its own
    with BuildSketch(Plane(origin=(0, 0.5, 0), x_dir=(1, 0, 0), z_dir=(0, 1, 0)).offset(CUT_EXTRUDE3_START)):
        with Locations(Location((7.512361042, 18.237068392, 0), (0, 0, 270))):
            Circle(SKETCH6_R_7)
        with Locations((7.512361042, 18.237068392)):
            Circle(SKETCH6_R_8, mode=Mode.SUBTRACT)
    # profile 5 of 12: a face of its own
    with BuildSketch(Plane(origin=(0, 0.5, 0), x_dir=(1, 0, 0), z_dir=(0, 1, 0)).offset(CUT_EXTRUDE3_START)):
        with Locations(Location((15.603207878, 6.050507476, 0), (0, 0, 270))):
            Circle(SKETCH6_R_9)
        with Locations((15.603207878, 6.050507476)):
            Circle(SKETCH6_R_10, mode=Mode.SUBTRACT)
    # profile 6 of 12: a face of its own
    with BuildSketch(Plane(origin=(0, 0.5, 0), x_dir=(1, 0, 0), z_dir=(0, 1, 0)).offset(CUT_EXTRUDE3_START)):
        with Locations((8.419413526, -21.012384273)):
            Rectangle(SKETCH6_W, SKETCH6_H)
        with Locations((8.419413526, -21.012384273)):
            Rectangle(SKETCH6_W_2, SKETCH6_H_2, mode=Mode.SUBTRACT)
    # profile 7 of 12: a face of its own
    with BuildSketch(Plane(origin=(0, 0.5, 0), x_dir=(1, 0, 0), z_dir=(0, 1, 0)).offset(CUT_EXTRUDE3_START)):
        with BuildLine():
            Line((-0.217706741, 17.598755635), (-9.371537009, 3.708232929))
            ThreePointArc((-9.371537009, 3.708232929), (-10.54356033, 3.604905623), (-10.89807984, 4.726792923))
            Line((-10.89807984, 4.726792923), (-1.662854791, 18.562986211))
            ThreePointArc((-1.662854791, 18.562986211), (-0.547475663, 18.669590616), (-0.217706741, 17.598755635))
        make_face()
        with BuildLine():
            Line((-0.306829257, 17.645248717), (-9.448675298, 3.772911532))
            ThreePointArc((-9.448675298, 3.772911532), (-10.488171503, 3.68816485), (-10.80864856, 4.68065103))
            Line((-10.80864856, 4.68065103), (-1.58551386, 18.498730584))
            ThreePointArc((-1.58551386, 18.498730584), (-0.602864551, 18.586331432), (-0.306829257, 17.645248717))
        make_face(mode=Mode.SUBTRACT)
    # profile 8 of 12: a face of its own
    with BuildSketch(Plane(origin=(0, 0.5, 0), x_dir=(1, 0, 0), z_dir=(0, 1, 0)).offset(CUT_EXTRUDE3_START)):
        with BuildLine():
            Line((12.618981444, 4.871230017), (13.98769886, 4.871230017))
            Line((13.98769886, 4.871230017), (5.447367138, 17.616466951))
            ThreePointArc((5.447367138, 17.616466951), (4.583373022, 17.899575591), (4.495313876, 16.994654643))
            Line((4.495313876, 16.994654643), (12.618981444, 4.871230017))
        make_face()
        with BuildLine():
            Line((12.672348148, 4.971230017), (13.800316104, 4.971230017))
            Line((13.800316104, 4.971230017), (5.357513848, 17.570918019))
            ThreePointArc((5.357513848, 17.570918019), (4.638532997, 17.816162349), (4.572305297, 17.059398095))
            Line((4.572305297, 17.059398095), (12.672348148, 4.971230017))
        make_face(mode=Mode.SUBTRACT)
    # profile 9 of 12: a face of its own
    with BuildSketch(Plane(origin=(0, 0.5, 0), x_dir=(1, 0, 0), z_dir=(0, 1, 0)).offset(CUT_EXTRUDE3_START)):
        with Locations(Location((11.55778446, 12.143787934, 0), (0, 0, 270))):
            Circle(SKETCH6_R_11)
        with Locations((11.55778446, 12.143787934)):
            Circle(SKETCH6_R_12, mode=Mode.SUBTRACT)
    # profile 10 of 12: a face of its own
    with BuildSketch(Plane(origin=(0, 0.5, 0), x_dir=(1, 0, 0), z_dir=(0, 1, 0)).offset(CUT_EXTRUDE3_START)):
        Polygon((15.487945589, -1.174597939), (14.929366945, -1.733176582), (11.662487473, -1.733176582), (11.103908829, -1.174597939), (11.103908829, 2.25741534), (11.662487473, 2.815993984), (14.929366945, 2.815993984), (15.487945589, 2.25741534), align=None)
        Polygon((15.387945589, -1.133176582), (14.887945589, -1.633176582), (11.703908829, -1.633176582), (11.203908829, -1.133176582), (11.203908829, 2.215993984), (11.703908829, 2.715993984), (14.887945589, 2.715993984), (15.387945589, 2.215993984), align=None, mode=Mode.SUBTRACT)
    # profile 11 of 12: a face of its own
    with BuildSketch(Plane(origin=(0, 0.5, 0), x_dir=(1, 0, 0), z_dir=(0, 1, 0)).offset(CUT_EXTRUDE3_START)):
        Polygon((14.418094061, -4.812831705), (14.259515417, -4.971410349), (14.259515417, -8.690016683), (15.487945589, -8.690016683), (15.487945589, -4.971410349), (15.329366945, -4.812831705), align=None)
        Polygon((14.459515417, -4.912831705), (14.359515417, -5.012831705), (14.359515417, -8.590016683), (15.387945589, -8.590016683), (15.387945589, -5.012831705), (15.287945589, -4.912831705), align=None, mode=Mode.SUBTRACT)
    # profile 12 of 12: a face of its own
    with BuildSketch(Plane(origin=(0, 0.5, 0), x_dir=(1, 0, 0), z_dir=(0, 1, 0)).offset(CUT_EXTRUDE3_START)):
        Polygon((12.332339001, -8.690016683), (11.103908829, -8.690016683), (11.103908829, -4.971410349), (11.262487473, -4.812831705), (12.173760357, -4.812831705), (12.332339001, -4.971410349), align=None)
        Polygon((12.232339001, -8.590016683), (11.203908829, -8.590016683), (11.203908829, -5.012831705), (11.303908829, -4.912831705), (12.132339001, -4.912831705), (12.232339001, -5.012831705), align=None, mode=Mode.SUBTRACT)
    extrude(amount=CUT_EXTRUDE3_DEPTH)


with BuildPart() as part_2:
    add(part_1.part)

    # Cut-Extrude3: cut by cut_extrude3_tool
    add(cut_extrude3_tool.part, mode=Mode.SUBTRACT)


with BuildPart() as body_2_2:
    add(body_2_1.part)

    # Cut-Extrude3: cut by cut_extrude3_tool
    add(cut_extrude3_tool.part, mode=Mode.SUBTRACT)


solid = Compound([part_2.part, body_2_2.part])
